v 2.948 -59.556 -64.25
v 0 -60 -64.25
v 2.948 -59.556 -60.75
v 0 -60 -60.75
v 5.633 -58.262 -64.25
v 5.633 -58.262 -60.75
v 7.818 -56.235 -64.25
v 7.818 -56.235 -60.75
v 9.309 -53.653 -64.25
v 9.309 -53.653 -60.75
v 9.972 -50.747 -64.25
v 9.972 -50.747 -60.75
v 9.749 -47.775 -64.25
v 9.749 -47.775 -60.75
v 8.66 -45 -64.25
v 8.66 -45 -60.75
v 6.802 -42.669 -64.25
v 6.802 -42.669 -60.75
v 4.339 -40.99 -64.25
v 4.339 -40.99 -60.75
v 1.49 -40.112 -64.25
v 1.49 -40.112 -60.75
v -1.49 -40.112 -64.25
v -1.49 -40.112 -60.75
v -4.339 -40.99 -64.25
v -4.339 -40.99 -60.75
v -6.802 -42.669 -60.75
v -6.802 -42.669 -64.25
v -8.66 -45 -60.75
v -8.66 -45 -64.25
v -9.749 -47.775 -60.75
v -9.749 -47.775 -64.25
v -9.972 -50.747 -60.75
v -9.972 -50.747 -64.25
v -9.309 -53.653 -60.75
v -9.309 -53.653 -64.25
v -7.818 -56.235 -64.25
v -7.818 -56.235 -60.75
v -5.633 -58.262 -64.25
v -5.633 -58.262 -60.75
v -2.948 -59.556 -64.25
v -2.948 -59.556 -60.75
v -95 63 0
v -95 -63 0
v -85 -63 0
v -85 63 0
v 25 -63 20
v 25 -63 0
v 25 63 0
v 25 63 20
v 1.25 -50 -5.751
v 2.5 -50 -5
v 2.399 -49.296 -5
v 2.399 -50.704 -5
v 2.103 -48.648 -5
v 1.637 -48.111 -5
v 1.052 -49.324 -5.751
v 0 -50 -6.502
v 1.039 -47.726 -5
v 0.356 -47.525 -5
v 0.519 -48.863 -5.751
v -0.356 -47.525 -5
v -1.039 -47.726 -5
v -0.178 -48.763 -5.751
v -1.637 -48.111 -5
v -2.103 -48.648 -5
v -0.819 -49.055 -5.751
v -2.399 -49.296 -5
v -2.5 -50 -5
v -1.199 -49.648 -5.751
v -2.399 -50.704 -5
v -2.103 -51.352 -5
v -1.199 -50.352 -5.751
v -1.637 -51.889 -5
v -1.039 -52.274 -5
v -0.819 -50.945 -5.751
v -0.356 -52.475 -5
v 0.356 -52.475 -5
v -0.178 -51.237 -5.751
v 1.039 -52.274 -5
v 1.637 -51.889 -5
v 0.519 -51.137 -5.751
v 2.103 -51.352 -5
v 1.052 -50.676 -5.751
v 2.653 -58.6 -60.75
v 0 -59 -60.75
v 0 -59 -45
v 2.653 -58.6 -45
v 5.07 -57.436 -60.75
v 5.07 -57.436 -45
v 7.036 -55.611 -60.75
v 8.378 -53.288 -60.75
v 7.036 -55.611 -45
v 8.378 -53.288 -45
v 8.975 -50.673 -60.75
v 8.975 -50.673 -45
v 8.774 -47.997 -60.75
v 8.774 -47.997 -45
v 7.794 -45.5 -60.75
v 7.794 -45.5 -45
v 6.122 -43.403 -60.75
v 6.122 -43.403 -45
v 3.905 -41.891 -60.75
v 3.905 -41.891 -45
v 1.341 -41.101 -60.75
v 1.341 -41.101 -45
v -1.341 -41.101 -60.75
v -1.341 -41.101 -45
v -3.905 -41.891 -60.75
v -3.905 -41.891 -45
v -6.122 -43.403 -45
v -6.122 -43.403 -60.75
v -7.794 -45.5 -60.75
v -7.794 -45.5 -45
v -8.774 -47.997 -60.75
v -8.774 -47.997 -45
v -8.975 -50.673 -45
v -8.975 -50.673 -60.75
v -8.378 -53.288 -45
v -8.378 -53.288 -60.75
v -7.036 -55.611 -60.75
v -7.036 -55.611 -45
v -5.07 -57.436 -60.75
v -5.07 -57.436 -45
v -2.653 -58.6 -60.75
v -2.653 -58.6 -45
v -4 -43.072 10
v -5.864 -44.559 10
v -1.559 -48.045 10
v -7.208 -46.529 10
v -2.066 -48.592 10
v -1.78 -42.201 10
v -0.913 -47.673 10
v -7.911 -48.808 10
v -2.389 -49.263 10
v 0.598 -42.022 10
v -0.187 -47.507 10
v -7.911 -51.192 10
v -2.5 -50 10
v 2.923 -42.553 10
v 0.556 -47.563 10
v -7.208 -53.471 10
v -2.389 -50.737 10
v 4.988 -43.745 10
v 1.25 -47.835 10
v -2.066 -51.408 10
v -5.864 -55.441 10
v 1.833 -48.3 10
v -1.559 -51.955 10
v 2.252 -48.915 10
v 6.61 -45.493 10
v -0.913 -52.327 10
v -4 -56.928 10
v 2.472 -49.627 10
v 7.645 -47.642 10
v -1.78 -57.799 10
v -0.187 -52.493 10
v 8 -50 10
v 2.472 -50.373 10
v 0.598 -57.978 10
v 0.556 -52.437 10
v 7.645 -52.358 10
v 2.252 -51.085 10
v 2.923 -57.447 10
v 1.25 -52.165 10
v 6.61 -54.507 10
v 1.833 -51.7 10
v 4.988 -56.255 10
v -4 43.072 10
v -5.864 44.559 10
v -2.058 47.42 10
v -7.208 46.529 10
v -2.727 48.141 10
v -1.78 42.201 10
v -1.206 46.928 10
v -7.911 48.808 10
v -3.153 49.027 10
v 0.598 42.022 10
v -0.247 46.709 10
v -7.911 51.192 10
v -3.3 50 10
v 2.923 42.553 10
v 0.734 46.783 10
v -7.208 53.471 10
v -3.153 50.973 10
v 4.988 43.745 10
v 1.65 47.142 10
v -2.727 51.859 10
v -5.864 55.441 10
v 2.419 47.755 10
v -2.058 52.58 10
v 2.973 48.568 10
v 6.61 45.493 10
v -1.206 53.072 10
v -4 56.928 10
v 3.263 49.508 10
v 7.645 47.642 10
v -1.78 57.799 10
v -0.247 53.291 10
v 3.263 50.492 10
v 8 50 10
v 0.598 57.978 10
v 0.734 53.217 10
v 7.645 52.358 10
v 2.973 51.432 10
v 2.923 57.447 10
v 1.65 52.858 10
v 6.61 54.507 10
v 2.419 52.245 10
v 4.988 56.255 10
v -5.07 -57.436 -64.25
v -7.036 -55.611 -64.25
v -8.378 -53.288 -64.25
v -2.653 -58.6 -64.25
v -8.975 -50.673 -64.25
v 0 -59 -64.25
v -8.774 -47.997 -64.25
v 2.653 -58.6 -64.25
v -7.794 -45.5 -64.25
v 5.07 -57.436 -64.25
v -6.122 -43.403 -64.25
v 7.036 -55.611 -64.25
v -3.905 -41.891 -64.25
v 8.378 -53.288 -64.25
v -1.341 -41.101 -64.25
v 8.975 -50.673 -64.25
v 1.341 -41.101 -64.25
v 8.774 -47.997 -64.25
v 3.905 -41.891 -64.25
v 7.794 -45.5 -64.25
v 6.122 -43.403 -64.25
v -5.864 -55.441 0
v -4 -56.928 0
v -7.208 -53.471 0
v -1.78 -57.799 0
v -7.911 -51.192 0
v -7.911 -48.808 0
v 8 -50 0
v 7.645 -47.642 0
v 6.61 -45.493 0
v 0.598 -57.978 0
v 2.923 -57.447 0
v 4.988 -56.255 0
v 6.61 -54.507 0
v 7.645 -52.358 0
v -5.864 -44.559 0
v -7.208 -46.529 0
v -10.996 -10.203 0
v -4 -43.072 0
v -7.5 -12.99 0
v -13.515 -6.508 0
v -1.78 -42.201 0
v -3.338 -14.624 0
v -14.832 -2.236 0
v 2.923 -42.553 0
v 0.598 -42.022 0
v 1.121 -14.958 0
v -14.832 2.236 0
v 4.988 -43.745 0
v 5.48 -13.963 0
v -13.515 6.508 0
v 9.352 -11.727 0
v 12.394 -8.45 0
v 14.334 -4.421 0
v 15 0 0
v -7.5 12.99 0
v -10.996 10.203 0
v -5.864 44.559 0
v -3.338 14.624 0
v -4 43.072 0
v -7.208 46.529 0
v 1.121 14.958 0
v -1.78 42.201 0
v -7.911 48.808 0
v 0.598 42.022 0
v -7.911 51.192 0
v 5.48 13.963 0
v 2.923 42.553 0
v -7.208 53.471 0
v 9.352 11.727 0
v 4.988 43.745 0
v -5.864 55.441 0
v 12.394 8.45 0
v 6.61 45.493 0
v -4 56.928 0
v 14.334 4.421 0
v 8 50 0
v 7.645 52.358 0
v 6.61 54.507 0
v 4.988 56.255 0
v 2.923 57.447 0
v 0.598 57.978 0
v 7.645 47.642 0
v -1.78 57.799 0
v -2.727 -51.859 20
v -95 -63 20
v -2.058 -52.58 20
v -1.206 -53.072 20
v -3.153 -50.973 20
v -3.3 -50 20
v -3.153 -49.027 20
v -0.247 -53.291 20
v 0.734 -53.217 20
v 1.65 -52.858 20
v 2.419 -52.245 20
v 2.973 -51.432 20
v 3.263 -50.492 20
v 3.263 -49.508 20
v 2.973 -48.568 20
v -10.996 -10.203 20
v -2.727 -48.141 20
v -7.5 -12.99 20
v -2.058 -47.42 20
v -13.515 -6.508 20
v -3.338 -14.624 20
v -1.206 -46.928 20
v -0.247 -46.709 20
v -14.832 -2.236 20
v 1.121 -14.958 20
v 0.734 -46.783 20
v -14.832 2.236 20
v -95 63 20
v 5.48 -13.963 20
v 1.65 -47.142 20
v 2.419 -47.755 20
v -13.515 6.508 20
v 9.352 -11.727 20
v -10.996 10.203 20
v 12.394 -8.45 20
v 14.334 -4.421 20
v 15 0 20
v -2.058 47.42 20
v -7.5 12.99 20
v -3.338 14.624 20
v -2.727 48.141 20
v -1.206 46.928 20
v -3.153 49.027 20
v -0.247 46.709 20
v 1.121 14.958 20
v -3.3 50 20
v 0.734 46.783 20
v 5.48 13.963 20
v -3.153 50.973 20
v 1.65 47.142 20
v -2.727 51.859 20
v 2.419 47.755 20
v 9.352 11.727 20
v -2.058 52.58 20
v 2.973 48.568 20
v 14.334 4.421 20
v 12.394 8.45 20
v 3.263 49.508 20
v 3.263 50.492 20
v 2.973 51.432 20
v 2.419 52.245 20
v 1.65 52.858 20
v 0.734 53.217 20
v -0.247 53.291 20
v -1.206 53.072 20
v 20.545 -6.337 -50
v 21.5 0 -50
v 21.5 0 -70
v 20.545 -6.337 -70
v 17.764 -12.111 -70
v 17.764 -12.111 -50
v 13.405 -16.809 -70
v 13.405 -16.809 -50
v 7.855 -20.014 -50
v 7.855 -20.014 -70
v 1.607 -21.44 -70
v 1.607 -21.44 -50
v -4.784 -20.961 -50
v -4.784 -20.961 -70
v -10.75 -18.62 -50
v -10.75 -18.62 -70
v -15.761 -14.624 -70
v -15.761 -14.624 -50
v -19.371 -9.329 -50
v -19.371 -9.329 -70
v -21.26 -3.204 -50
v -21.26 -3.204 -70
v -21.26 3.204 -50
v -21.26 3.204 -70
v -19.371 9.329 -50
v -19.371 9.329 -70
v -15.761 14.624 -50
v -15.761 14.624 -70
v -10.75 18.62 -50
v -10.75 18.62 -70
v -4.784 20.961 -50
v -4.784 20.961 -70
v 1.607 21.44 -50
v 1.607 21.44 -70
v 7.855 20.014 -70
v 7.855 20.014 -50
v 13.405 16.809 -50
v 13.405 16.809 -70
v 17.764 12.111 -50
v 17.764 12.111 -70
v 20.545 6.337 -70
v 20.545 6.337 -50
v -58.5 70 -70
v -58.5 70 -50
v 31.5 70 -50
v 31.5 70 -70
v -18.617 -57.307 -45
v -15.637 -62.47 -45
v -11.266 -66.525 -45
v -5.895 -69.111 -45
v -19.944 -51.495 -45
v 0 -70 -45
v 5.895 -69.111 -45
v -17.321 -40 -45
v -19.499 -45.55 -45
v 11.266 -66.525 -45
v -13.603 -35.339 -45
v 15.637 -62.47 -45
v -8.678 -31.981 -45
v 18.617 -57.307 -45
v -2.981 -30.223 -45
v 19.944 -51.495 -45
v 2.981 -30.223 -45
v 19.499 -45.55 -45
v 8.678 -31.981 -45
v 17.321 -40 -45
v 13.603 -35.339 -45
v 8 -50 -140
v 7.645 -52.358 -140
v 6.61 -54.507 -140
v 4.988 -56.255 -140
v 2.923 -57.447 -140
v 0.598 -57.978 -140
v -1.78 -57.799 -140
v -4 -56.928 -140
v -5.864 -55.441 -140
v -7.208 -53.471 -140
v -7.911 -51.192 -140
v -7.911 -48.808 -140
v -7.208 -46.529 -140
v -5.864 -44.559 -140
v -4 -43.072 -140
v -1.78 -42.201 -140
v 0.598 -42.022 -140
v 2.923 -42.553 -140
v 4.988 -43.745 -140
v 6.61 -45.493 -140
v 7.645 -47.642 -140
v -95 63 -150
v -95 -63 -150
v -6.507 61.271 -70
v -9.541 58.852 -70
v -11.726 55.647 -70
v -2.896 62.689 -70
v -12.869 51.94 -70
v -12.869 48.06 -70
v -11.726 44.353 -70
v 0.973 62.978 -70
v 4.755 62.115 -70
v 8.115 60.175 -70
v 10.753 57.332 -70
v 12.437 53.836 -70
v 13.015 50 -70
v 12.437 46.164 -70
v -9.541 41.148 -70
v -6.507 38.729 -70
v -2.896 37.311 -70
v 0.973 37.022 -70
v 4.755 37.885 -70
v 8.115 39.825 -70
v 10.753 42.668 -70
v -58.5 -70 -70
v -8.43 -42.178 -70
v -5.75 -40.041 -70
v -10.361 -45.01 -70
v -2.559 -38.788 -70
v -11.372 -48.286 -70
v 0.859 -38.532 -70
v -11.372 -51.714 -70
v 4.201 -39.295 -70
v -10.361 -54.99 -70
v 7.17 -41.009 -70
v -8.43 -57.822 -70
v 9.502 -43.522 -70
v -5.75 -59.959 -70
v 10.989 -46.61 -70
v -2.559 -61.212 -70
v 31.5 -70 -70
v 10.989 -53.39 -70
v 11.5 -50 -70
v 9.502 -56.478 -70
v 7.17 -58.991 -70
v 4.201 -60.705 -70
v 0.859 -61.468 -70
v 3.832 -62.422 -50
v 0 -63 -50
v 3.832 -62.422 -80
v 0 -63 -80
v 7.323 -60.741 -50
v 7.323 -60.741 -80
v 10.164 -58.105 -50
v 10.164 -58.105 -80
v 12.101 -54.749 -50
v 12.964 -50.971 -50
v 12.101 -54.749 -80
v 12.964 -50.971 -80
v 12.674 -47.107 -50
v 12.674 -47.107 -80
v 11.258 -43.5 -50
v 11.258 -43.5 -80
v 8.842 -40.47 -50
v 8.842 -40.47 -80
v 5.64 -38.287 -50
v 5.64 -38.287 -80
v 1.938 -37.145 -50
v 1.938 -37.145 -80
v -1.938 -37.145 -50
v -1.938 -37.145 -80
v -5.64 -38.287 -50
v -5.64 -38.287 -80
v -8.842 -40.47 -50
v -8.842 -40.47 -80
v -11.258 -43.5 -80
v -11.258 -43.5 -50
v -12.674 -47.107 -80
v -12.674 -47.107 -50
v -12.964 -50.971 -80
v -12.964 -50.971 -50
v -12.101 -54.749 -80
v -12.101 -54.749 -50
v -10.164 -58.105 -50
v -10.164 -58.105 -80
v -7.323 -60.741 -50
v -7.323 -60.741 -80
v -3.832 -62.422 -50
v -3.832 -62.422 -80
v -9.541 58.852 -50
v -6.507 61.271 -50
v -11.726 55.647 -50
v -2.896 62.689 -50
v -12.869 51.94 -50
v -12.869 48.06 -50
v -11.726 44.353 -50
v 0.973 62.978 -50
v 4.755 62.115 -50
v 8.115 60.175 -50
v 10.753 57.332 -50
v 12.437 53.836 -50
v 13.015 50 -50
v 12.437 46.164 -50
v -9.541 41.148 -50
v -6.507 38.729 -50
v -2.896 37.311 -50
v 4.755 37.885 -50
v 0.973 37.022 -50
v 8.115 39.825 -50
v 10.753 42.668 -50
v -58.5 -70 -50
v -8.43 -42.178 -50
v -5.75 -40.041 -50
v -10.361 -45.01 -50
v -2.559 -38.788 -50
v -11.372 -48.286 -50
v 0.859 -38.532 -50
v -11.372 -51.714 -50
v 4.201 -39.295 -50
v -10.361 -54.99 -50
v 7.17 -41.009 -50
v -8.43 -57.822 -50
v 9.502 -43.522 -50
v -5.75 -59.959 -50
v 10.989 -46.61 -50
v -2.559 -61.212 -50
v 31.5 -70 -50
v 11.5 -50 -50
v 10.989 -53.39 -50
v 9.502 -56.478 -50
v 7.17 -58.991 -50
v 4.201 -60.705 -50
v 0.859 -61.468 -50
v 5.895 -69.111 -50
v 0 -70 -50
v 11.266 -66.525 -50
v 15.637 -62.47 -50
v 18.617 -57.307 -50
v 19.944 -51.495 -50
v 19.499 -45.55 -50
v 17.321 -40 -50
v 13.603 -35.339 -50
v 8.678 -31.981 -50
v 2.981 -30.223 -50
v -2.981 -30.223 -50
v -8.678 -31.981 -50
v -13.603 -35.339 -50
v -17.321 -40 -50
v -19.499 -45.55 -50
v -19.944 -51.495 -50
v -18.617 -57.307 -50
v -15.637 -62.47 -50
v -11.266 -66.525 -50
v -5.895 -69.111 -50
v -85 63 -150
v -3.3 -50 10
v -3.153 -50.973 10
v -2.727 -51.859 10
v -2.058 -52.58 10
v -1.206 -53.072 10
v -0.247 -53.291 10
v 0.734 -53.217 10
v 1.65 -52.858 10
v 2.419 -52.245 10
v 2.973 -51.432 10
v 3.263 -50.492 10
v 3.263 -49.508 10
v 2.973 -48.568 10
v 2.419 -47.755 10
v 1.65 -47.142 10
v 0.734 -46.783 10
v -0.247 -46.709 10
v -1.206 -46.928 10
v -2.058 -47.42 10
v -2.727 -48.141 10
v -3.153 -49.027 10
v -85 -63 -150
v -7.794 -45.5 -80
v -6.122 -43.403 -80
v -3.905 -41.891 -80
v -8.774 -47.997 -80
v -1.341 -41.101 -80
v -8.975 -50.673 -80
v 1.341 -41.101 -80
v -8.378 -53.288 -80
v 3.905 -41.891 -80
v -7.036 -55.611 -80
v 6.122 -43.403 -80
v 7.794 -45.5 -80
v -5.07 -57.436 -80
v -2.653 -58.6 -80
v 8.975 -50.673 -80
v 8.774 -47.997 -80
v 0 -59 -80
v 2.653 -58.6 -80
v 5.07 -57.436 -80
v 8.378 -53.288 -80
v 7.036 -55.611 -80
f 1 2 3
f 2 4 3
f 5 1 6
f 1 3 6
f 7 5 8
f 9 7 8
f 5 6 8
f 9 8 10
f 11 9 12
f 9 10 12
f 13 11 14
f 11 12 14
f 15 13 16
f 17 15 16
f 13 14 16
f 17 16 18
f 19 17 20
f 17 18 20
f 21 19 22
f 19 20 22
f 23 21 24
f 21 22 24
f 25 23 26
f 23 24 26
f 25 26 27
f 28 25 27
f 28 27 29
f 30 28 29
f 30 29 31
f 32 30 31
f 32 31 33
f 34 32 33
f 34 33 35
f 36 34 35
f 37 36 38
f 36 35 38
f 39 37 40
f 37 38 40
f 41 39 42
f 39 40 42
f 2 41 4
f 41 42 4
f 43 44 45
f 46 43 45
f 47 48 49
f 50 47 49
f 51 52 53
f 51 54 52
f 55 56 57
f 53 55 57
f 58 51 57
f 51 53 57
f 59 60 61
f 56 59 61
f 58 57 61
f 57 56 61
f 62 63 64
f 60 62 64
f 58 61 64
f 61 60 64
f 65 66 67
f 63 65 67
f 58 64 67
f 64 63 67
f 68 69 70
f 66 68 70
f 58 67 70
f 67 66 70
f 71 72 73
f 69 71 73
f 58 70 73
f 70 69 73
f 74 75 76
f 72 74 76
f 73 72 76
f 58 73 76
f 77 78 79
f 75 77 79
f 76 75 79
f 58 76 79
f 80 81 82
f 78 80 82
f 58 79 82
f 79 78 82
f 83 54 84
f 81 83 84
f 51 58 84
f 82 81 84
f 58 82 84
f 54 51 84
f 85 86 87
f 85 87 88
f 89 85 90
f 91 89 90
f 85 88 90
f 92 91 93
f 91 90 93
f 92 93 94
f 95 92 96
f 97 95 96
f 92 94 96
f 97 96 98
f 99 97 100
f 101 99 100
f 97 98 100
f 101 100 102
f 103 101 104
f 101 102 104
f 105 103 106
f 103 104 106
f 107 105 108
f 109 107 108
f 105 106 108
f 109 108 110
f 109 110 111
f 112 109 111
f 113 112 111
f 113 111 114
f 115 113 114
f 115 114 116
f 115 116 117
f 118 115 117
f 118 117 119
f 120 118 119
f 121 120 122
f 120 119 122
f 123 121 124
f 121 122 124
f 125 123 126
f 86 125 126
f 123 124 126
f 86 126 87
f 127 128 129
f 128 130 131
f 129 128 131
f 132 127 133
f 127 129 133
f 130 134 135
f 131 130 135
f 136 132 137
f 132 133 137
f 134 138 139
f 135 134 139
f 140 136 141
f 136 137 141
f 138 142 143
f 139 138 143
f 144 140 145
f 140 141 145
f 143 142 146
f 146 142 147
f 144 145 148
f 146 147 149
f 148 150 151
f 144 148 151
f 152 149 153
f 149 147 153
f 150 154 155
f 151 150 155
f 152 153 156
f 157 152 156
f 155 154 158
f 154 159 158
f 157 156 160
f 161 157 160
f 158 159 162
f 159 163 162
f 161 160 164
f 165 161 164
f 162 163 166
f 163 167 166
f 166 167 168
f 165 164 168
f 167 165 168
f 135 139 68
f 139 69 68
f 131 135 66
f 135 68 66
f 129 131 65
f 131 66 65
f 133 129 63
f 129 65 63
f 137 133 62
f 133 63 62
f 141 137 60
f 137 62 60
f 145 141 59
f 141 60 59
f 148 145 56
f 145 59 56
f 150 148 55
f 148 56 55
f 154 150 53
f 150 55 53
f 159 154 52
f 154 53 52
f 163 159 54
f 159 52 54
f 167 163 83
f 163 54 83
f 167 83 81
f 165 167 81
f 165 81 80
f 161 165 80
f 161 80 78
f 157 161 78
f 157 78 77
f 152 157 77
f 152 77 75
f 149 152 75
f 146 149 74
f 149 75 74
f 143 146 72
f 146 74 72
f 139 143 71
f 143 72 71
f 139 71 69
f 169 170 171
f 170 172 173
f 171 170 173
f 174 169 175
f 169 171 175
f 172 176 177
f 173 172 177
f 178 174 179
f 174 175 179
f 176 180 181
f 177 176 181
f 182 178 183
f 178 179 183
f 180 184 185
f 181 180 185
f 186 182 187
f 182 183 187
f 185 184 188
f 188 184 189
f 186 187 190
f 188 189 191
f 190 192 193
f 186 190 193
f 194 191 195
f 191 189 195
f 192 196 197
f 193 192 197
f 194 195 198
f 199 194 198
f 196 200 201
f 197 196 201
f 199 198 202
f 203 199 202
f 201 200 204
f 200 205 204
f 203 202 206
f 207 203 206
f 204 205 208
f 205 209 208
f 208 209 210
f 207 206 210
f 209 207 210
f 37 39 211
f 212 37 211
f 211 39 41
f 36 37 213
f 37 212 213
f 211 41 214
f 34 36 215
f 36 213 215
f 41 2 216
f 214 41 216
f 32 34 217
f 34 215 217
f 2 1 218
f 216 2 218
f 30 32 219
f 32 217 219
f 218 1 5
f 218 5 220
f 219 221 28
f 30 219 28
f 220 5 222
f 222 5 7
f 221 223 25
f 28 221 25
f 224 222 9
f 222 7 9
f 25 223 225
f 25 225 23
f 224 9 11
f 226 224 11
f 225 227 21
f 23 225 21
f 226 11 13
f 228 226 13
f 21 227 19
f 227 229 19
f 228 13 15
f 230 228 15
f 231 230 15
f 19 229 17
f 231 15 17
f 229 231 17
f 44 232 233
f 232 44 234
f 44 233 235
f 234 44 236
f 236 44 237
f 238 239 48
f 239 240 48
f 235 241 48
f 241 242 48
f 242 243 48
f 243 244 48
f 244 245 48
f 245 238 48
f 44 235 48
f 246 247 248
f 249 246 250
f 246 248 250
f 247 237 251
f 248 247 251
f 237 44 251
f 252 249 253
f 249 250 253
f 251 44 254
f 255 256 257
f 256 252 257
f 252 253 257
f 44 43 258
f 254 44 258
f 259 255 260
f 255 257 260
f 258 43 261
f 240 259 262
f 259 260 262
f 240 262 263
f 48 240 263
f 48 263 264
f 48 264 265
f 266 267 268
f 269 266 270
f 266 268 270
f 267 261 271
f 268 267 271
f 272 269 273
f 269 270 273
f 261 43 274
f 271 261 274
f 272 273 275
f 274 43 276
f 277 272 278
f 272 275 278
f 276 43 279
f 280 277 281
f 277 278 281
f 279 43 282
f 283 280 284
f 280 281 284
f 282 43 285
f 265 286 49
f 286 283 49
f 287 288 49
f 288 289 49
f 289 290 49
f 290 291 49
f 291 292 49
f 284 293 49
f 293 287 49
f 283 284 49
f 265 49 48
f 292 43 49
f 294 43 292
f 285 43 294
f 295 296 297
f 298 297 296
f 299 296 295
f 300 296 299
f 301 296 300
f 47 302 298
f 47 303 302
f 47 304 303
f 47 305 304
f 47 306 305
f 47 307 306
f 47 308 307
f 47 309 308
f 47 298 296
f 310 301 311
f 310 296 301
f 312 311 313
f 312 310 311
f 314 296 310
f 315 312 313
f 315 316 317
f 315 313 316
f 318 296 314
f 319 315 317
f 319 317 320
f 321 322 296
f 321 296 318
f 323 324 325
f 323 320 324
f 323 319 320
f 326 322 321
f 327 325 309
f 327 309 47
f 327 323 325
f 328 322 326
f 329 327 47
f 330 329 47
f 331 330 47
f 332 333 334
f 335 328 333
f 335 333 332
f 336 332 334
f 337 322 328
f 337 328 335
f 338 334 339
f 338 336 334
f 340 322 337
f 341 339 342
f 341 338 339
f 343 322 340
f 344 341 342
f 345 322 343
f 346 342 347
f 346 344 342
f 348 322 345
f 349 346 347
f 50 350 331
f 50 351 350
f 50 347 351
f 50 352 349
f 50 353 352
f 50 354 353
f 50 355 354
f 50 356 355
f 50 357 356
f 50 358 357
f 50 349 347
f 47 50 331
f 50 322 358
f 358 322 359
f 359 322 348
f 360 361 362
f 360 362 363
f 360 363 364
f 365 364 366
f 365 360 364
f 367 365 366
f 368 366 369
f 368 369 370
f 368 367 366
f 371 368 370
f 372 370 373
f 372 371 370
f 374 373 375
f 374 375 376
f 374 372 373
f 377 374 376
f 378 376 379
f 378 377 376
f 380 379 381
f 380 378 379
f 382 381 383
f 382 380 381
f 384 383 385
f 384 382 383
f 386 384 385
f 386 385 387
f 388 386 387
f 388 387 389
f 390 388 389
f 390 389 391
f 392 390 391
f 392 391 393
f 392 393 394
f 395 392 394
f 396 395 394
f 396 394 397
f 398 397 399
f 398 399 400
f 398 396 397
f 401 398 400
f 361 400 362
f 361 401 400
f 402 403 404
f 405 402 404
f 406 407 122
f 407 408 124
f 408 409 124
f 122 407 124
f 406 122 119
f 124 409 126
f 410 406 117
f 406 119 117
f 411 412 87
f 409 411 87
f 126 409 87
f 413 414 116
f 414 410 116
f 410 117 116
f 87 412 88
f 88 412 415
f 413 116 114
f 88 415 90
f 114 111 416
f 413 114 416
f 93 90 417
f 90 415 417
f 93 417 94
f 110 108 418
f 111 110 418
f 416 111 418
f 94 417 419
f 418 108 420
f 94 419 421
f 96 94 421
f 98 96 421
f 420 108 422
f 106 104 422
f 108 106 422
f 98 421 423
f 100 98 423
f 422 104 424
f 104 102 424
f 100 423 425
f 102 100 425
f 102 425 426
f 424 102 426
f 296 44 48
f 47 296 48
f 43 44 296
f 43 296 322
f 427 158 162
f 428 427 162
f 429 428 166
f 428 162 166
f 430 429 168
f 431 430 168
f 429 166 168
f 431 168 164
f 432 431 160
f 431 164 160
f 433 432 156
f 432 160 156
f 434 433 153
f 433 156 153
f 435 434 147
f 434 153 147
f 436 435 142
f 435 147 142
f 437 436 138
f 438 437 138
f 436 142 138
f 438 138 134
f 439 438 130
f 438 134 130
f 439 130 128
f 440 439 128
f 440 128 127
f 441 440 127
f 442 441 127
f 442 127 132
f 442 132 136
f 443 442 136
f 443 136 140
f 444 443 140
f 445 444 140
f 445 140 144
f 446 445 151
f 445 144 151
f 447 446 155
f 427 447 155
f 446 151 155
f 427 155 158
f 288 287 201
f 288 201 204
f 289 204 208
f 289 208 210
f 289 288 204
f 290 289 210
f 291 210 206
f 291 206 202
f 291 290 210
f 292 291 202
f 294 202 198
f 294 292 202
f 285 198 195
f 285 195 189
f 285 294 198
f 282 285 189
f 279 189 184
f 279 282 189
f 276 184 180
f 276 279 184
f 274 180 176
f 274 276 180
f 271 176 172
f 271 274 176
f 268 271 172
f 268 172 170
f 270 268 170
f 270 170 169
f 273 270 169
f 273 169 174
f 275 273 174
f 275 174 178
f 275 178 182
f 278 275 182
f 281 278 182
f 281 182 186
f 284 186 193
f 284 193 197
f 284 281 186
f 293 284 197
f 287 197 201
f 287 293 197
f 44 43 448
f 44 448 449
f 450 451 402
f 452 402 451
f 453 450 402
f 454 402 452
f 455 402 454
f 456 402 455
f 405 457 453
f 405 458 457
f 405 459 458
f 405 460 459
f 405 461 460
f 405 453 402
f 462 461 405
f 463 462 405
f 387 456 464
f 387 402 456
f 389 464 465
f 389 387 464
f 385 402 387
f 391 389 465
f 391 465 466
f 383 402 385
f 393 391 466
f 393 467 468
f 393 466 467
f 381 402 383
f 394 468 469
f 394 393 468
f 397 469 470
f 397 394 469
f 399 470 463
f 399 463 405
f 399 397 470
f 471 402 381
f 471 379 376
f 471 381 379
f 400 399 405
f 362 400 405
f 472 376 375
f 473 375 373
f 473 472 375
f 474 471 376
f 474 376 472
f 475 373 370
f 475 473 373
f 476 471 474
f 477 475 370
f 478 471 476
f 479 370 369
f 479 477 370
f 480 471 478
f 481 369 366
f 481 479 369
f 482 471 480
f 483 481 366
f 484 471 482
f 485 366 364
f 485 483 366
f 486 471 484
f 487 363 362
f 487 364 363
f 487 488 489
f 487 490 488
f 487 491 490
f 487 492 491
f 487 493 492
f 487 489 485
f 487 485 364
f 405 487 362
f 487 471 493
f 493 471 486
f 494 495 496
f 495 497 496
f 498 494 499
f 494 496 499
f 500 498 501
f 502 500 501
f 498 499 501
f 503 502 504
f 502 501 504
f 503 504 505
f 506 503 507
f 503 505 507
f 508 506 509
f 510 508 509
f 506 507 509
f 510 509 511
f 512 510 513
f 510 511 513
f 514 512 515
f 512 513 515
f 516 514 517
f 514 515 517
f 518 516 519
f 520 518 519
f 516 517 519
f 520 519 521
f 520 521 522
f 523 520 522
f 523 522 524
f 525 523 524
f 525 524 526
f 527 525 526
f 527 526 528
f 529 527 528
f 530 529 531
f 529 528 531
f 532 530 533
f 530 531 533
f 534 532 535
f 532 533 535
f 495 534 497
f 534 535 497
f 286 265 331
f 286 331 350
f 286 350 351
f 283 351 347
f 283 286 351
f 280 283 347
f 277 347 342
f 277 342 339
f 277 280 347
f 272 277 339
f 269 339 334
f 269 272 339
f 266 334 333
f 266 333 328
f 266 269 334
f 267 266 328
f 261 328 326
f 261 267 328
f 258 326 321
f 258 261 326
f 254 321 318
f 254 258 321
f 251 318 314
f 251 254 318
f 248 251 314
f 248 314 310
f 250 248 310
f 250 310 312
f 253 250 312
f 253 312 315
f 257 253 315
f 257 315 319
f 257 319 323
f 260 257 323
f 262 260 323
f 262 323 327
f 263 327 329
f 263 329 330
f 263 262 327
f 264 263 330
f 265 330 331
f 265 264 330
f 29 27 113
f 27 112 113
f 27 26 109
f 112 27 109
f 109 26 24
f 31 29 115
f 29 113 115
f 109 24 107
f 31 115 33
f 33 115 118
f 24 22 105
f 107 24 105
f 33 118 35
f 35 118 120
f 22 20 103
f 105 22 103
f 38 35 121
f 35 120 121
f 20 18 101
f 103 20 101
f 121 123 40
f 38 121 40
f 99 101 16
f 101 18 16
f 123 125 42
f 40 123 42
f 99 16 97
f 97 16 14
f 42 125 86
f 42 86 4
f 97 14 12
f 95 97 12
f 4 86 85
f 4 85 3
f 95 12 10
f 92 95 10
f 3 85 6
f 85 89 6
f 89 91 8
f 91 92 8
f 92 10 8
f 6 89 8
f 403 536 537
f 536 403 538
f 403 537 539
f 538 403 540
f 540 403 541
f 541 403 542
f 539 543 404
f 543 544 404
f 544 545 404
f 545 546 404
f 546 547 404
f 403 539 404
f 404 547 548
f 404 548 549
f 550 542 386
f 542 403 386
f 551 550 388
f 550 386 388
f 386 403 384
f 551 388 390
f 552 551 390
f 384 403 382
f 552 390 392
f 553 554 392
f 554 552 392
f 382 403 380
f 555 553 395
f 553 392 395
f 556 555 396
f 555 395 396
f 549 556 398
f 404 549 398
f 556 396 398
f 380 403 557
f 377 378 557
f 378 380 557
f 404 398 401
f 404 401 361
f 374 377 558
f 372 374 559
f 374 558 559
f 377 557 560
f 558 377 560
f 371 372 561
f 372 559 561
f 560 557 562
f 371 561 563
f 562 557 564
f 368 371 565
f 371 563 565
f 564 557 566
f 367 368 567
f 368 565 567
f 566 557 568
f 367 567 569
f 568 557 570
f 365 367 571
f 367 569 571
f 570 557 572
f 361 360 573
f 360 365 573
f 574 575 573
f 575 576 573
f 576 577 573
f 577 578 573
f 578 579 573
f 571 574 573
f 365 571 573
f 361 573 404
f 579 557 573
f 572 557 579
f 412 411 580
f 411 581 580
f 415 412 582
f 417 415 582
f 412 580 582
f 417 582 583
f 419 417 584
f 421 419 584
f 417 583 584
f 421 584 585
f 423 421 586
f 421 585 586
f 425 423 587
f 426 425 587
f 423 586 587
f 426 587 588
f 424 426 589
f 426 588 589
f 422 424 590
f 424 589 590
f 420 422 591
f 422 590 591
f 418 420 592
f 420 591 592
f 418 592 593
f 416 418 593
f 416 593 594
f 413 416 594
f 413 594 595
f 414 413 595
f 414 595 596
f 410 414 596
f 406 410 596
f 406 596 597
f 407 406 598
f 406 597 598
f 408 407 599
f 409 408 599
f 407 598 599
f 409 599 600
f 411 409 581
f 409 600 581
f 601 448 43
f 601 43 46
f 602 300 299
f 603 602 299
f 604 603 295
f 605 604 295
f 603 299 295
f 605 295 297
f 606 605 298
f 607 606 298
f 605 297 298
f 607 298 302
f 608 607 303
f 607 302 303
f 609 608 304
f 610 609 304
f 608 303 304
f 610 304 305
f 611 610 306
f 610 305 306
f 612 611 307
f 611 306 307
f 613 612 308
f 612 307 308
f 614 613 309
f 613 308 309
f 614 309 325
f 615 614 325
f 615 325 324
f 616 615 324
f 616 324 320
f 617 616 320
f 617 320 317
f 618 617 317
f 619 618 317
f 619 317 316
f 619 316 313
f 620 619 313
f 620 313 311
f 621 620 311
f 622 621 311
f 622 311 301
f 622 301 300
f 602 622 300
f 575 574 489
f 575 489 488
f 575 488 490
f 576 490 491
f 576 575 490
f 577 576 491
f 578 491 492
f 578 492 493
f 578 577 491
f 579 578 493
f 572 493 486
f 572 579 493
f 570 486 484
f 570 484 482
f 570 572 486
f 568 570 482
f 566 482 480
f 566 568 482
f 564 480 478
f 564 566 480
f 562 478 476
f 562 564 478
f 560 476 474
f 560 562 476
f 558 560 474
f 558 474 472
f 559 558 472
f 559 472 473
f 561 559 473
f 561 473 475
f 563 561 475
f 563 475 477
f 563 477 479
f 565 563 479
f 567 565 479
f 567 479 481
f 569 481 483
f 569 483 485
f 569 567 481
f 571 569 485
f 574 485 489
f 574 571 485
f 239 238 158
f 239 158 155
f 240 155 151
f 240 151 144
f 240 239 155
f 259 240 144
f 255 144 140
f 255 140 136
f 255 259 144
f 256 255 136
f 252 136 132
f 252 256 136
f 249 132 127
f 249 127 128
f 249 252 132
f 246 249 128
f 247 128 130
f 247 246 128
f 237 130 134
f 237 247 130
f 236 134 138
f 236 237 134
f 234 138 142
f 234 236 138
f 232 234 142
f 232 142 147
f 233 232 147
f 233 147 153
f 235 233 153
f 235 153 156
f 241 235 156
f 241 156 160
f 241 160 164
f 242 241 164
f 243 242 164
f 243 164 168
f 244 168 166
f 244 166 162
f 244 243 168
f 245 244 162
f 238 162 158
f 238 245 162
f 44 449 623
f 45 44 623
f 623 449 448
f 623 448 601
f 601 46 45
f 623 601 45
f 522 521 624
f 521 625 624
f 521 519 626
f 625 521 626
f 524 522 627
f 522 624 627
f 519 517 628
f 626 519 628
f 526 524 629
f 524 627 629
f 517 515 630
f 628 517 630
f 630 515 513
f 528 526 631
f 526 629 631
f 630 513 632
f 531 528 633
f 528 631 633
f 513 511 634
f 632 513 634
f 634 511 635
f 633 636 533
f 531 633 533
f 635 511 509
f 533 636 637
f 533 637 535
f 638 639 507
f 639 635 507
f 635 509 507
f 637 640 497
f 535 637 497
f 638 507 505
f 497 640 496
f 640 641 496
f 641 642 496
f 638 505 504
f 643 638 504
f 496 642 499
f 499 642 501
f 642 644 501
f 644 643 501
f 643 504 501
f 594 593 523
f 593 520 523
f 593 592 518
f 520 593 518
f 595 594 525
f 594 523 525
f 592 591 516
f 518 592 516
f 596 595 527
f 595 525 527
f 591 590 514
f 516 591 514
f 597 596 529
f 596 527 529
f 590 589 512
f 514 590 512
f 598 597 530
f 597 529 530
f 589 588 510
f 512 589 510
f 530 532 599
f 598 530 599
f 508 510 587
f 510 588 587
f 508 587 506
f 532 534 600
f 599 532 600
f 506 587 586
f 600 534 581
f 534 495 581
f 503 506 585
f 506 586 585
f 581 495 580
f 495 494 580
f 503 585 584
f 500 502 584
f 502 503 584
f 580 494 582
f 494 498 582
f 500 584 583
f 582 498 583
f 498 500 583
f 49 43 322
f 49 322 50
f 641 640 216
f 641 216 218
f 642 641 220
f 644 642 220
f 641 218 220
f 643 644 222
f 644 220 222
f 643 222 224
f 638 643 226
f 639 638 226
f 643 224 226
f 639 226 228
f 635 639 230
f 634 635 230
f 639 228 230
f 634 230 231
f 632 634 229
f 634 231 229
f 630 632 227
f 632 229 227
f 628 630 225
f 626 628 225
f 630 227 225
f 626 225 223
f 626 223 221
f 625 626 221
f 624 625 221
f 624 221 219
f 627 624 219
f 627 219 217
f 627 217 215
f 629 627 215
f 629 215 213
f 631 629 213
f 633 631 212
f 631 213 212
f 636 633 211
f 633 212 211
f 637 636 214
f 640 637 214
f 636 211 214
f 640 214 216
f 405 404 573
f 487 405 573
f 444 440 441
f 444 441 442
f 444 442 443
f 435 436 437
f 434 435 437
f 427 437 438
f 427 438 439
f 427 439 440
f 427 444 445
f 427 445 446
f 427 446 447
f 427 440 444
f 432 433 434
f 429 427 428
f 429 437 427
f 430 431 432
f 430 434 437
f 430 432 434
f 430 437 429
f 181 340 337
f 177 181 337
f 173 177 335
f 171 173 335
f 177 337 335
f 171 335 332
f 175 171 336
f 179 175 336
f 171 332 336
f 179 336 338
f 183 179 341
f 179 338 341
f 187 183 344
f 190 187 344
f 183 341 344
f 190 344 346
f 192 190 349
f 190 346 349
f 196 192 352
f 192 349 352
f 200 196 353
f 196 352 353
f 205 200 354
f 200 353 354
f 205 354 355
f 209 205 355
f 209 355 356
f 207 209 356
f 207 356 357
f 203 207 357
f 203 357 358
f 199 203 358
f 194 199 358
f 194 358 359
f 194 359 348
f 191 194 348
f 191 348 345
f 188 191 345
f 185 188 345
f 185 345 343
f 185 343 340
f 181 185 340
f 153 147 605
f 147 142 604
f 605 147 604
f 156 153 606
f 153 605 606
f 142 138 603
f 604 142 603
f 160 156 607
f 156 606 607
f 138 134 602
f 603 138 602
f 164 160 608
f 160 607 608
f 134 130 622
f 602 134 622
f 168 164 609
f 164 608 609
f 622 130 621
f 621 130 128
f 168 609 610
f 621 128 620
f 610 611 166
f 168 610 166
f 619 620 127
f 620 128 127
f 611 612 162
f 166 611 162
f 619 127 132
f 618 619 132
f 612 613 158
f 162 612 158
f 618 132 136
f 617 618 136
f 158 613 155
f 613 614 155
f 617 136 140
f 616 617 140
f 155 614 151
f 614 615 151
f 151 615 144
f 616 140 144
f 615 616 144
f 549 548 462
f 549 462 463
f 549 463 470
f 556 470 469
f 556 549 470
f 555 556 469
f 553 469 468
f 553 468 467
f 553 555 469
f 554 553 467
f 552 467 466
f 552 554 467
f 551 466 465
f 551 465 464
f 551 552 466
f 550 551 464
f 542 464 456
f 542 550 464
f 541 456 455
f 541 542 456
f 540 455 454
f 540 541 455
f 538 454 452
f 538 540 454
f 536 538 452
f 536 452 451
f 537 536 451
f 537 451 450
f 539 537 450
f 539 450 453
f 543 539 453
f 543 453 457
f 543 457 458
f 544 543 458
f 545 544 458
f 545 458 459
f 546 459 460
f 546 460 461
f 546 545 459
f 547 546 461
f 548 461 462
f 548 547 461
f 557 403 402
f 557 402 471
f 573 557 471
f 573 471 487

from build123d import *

# Parameters (mm, degrees)
F0_W      = 120
F0_H      = 126
F0_R      = 8
F0_R_2    = 15
F1_DEPTH  = 20
F2_DEPTH  = 10
F3_D      = 6.6
F4_R      = 8
F5_DEPTH  = 150
F7_D      = 5
F7_DEPTH  = 15
F7_TIP    = 1.5021515476
F8_W      = 10
F8_H      = 126
F9_DEPTH  = 150
F11_W     = 90
F11_H     = 140
F11_R     = 13.0148133909
F11_R_2   = 21.5
F11_R_3   = 11.5
F12_DEPTH = 20


with BuildPart() as f1:
    # F0 (on Top) → F1 (new body)
    with BuildSketch(Plane.XY):
        with Locations((-35, 0)):
            Rectangle(F0_W, F0_H)
        with Locations((0, -50)):
            Circle(F0_R, mode=Mode.SUBTRACT)
        Circle(F0_R_2, mode=Mode.SUBTRACT)
        with Locations((0, 50)):
            Circle(F0_R, mode=Mode.SUBTRACT)
        with Locations((0, -50)):
            Circle(F0_R)
        with Locations((0, 50)):
            Circle(F0_R)
    extrude(amount=F1_DEPTH)

    # F0 (on Top) → F2 (cut)
    with BuildSketch(Plane.XY):
        with Locations((0, -50)):
            Circle(F0_R)
        with Locations((0, 50)):
            Circle(F0_R)
    extrude(amount=F2_DEPTH, mode=Mode.SUBTRACT)

    # F3 (through all)
    with Locations(Plane(origin=(0, 0, 0), x_dir=(1, 0, 0), z_dir=(0, 0, -1))):
        with Locations((0, 50), (0, -50)):
            Hole(F3_D / 2)


with BuildPart() as f5:
    # F4 (on face) → F5 (new body)
    with BuildSketch(Plane(origin=(0, 0, 10), x_dir=(1, 0, 0), z_dir=(0, 0, -1))):
        with Locations((0, 50)):
            Circle(F4_R)
    extrude(amount=F5_DEPTH)

    # F7
    with Locations(Plane.XY.offset(10)):
        with Locations((0, -50)):
            Hole(F7_D / 2, depth=F7_DEPTH)
            with Locations((0, 0, -(F7_DEPTH + F7_TIP / 2))):  # 118° drill point
                Cone(0, F7_D / 2, F7_TIP, mode=Mode.SUBTRACT)


with BuildPart() as f9:
    # F8 (on face) → F9 (new body)
    with BuildSketch(Plane(origin=(0, 0, 0), x_dir=(1, 0, 0), z_dir=(0, 0, -1))):
        with Locations((-90, 0)):
            Rectangle(F8_W, F8_H)
    extrude(amount=F9_DEPTH)


with BuildPart() as f12:
    # F11 (on offset) → F12 (new body)
    with BuildSketch(Plane(origin=(0, 0, -50), x_dir=(1, 0, 0), z_dir=(0, 0, -1))):
        with Locations((-13.5, 0)):
            Rectangle(F11_W, F11_H)
        with Locations((0, -50)):
            Circle(F11_R, mode=Mode.SUBTRACT)
        Circle(F11_R_2, mode=Mode.SUBTRACT)
        with Locations((0, 50)):
            Circle(F11_R_3, mode=Mode.SUBTRACT)
    extrude(amount=F12_DEPTH)


with BuildPart() as f14:
    # F13 (on Right) → F14 (revolve)
    with BuildSketch(Plane.YZ):
        Polygon((-63, -50), (-63, -80), (-59, -80), (-59, -64.25), (-60, -64.25), (-60, -60.75), (-59, -60.75), (-59, -45), (-70, -45), (-70, -50), align=None)
    revolve(axis=Axis((0, -50, -85.4690910131), (0, 0, 1)))


solid = Compound([f1.part, f5.part, f9.part, f12.part, f14.part])
